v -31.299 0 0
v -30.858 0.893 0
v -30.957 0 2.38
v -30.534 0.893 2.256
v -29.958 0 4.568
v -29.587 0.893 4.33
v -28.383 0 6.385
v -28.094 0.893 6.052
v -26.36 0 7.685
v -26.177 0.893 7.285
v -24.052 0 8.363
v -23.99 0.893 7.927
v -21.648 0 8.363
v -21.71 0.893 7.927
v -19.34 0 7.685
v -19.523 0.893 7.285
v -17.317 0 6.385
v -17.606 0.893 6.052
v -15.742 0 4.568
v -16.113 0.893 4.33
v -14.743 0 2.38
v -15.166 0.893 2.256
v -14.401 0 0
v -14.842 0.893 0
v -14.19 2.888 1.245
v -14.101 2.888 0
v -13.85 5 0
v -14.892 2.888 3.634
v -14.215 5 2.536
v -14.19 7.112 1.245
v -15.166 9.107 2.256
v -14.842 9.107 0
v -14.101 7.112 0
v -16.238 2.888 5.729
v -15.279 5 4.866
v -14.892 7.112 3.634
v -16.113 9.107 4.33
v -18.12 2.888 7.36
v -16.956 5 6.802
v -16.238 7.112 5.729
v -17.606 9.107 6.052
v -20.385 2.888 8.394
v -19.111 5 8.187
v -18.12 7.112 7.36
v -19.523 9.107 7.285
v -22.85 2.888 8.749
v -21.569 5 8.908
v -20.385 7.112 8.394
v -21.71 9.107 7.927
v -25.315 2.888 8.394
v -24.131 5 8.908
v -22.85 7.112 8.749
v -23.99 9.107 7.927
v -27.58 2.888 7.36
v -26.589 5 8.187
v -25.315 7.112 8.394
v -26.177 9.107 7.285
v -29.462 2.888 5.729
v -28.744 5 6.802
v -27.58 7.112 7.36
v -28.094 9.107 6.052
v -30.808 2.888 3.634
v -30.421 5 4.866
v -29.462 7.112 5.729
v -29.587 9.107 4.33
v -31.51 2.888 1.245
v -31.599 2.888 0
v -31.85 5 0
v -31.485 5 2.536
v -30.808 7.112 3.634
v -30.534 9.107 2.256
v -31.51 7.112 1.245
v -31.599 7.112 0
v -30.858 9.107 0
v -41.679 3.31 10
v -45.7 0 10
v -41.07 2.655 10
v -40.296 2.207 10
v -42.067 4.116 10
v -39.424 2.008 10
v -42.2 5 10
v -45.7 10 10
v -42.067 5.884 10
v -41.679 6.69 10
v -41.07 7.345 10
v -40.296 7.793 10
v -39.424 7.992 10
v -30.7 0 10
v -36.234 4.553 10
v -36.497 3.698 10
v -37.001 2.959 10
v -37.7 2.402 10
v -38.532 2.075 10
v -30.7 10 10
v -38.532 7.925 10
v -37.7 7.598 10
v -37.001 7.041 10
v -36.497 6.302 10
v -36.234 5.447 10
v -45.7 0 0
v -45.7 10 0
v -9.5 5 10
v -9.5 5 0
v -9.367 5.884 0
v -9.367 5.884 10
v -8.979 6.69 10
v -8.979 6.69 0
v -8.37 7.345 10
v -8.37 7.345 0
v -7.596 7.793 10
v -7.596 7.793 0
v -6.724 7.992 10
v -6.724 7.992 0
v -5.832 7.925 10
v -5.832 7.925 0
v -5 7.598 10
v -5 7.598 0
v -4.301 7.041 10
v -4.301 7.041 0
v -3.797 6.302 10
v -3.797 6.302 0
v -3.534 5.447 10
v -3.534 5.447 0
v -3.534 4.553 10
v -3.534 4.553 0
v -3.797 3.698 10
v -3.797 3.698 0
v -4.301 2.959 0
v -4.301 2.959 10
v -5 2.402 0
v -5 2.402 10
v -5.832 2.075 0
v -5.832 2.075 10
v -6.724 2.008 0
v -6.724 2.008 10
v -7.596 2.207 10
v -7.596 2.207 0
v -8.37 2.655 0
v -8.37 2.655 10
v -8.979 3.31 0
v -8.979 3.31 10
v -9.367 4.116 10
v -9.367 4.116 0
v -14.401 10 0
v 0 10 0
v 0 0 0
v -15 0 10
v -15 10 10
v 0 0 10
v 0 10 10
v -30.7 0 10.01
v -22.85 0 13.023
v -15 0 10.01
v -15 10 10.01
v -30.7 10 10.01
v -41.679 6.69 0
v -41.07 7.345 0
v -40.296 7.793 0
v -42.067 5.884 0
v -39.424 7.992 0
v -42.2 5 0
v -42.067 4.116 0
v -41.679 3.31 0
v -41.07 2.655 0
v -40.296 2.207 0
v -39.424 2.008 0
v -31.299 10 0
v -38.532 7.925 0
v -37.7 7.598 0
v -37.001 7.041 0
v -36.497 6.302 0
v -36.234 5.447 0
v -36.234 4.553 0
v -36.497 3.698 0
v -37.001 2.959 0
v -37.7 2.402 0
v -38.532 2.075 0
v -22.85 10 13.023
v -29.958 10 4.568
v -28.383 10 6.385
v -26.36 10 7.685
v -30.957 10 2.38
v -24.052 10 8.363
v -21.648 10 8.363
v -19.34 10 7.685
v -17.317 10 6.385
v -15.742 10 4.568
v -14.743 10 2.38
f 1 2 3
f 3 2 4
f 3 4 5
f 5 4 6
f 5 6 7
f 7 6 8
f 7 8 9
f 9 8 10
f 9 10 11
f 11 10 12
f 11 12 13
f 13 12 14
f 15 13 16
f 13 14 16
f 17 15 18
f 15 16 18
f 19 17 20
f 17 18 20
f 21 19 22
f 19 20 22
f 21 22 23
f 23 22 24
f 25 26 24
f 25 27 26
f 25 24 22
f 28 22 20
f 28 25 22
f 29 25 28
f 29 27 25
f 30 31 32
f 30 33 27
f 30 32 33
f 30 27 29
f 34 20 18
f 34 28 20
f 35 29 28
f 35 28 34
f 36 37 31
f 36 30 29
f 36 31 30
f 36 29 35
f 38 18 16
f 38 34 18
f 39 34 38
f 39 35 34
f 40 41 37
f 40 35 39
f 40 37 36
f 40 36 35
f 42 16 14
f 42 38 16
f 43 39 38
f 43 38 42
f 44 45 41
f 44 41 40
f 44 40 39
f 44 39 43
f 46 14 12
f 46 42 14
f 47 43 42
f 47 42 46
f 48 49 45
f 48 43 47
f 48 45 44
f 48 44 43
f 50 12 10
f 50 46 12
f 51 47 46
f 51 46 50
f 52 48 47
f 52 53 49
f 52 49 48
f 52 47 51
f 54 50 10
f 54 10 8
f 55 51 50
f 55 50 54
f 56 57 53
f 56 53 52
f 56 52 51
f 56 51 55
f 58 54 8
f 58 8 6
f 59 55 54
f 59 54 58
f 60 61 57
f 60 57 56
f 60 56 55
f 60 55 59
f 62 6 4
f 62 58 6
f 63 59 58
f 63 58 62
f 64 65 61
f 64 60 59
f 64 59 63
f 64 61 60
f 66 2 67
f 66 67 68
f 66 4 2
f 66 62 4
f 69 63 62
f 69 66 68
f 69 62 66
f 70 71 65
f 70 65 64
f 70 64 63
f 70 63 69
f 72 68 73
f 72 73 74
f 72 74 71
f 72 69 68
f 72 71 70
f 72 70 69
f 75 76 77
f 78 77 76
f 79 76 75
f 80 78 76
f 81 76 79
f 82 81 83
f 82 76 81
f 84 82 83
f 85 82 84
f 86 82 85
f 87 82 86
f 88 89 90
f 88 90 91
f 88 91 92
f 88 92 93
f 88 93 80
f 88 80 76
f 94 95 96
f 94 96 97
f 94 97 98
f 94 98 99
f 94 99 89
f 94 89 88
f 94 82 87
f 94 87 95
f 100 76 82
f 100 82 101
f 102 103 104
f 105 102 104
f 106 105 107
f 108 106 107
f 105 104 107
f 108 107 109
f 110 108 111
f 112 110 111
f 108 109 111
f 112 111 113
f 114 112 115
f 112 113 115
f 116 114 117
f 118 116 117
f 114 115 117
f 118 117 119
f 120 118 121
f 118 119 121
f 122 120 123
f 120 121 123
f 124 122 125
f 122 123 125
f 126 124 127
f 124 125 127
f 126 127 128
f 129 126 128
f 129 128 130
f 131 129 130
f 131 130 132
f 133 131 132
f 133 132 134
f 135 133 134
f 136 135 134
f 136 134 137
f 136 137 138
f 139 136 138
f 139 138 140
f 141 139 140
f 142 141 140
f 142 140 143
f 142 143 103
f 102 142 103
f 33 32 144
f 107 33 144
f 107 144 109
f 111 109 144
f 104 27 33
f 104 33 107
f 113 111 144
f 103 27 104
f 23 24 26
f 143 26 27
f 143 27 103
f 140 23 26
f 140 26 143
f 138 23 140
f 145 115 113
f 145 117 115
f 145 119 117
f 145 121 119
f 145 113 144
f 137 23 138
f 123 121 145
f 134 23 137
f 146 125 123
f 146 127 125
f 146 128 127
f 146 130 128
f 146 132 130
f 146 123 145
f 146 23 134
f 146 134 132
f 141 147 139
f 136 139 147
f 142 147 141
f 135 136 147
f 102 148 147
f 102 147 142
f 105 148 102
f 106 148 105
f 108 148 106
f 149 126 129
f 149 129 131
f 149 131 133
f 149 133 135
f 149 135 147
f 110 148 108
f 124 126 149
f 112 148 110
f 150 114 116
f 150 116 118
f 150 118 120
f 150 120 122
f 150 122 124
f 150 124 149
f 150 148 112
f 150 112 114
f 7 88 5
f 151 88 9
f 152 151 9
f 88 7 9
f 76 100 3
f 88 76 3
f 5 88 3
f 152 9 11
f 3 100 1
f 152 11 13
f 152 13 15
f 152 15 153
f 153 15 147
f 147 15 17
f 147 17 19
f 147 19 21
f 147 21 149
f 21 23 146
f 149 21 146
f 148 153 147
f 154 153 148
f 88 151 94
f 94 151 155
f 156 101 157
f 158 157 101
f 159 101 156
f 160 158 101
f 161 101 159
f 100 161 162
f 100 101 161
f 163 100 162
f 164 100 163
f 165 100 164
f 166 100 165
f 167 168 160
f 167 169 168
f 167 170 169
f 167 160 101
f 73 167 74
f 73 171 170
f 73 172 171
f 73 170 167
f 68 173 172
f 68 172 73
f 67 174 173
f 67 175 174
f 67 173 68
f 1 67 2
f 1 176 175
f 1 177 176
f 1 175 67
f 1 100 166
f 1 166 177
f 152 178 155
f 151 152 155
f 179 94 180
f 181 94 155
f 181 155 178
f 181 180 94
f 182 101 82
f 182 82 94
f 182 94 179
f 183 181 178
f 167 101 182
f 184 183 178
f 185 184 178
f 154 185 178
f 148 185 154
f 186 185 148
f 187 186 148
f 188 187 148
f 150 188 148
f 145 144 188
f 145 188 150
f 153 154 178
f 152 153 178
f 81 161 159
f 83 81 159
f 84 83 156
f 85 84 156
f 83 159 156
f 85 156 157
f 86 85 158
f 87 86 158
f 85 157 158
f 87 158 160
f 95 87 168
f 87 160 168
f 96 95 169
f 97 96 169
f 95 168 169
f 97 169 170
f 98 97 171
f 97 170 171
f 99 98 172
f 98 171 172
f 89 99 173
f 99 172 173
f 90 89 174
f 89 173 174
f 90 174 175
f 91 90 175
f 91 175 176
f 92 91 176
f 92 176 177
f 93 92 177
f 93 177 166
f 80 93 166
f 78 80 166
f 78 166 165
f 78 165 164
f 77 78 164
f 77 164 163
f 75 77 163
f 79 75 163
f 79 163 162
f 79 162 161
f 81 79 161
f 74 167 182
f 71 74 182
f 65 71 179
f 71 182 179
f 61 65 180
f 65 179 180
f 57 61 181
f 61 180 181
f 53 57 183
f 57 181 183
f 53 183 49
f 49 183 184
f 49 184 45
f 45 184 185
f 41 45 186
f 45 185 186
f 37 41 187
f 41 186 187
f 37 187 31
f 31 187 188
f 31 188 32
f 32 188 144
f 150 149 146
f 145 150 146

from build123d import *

# Parameters (mm, degrees)
SKETCH2_W           = 45.7
SKETCH2_H           = 15
BOSS_EXTRUDE1_DEPTH = 10
SKETCH4_R           = 3
CUT_EXTRUDE1_DEPTH  = 50.127283662
SKETCH5_W           = 15
SKETCH5_H           = 10
CUT_EXTRUDE2_DEPTH  = 5
CHAMFER1_SIZE       = 4.990232455
CHAMFER1_SIZE_2     = 13
CHAMFER2_SIZE       = 0.965614075


with BuildPart() as part:
    # Sketch2 → Boss-Extrude1 (new body)
    with BuildSketch(Plane(origin=(0, 0, 0), x_dir=(1, 0, 0), z_dir=(0, 1, 0))):
        with Locations((-22.85, -7.5)):
            Rectangle(SKETCH2_W, SKETCH2_H)
    extrude(amount=BOSS_EXTRUDE1_DEPTH)

    # Sketch3 → Cut-Revolve1 (revolve, cut)
    with BuildSketch(Plane(origin=(0, 0, 0), x_dir=(-1, 0, 0), z_dir=(0, 0, -1))):
        with BuildLine():
            Line((22.85, 14), (22.85, -4))
            ThreePointArc((22.85, -4), (13.85, 5), (22.85, 14))
        make_face()
    revolve(axis=Axis((-22.85, 14, 0), (0, -1, 0)), mode=Mode.SUBTRACT)

    # Sketch4 → Cut-Extrude1 (cut, through all)
    with BuildSketch(Plane(origin=(0, 0, 0), x_dir=(-1, 0, 0), z_dir=(0, 0, -1))):
        with Locations((6.5, 5)):
            Circle(SKETCH4_R)
        with Locations((39.2, 5)):
            Circle(SKETCH4_R)
    extrude(amount=-CUT_EXTRUDE1_DEPTH, mode=Mode.SUBTRACT)

    # Sketch5 → Cut-Extrude2 (cut)
    with BuildSketch(Plane.XY.offset(15)):
        with Locations((-38.2, 5)):
            Rectangle(SKETCH5_W, SKETCH5_H)
        with Locations((-7.5, 5)):
            Rectangle(SKETCH5_W, SKETCH5_H)
    extrude(amount=-CUT_EXTRUDE2_DEPTH, mode=Mode.SUBTRACT)

    # Chamfer1
    # the kernel refuses this chamfer: 13, 4.990232455 mm, written as the material it takes off along each edge
    with BuildSketch(Plane(origin=(-15, 43.716873314, 15), x_dir=(0, 0, -1), z_dir=(0, -1, 0))) as chamfer1_piece_1:
        Polygon((CHAMFER1_SIZE, 0), (0, -CHAMFER1_SIZE_2), (0, 0), align=None)
    extrude(amount=77.433746627, mode=Mode.SUBTRACT)
    with BuildSketch(Plane(origin=(-30.7, 43.716873314, 15), x_dir=(1, 0, 0), z_dir=(0, -1, 0))) as chamfer1_piece_2:
        Polygon((CHAMFER1_SIZE_2, 0), (0, -CHAMFER1_SIZE), (0, 0), align=None)
    extrude(amount=77.433746627, mode=Mode.SUBTRACT)

    # Chamfer2
    # the kernel refuses this chamfer: 1, 0.965614075 mm, written as the material it takes off along each edge
    with BuildSketch(Plane(origin=(-22.85, 0, 0), x_dir=(-0.9379115380464662, 0, -0.34687454043113636), z_dir=(0.34687454043113636, 0, -0.9379115380464662))) as chamfer2_piece_1:
        with BuildLine():
            Line((7.483314774 + CHAMFER2_SIZE, 0), (8.008407714, 0.893248743))
            ThreePointArc((8.008407714, 0.893248743), (7.764305072, 0.44856432), (7.483314774, 0))
            Line((7.483314774, 0), (7.483314774 + CHAMFER2_SIZE, 0))
        make_face()
    revolve(axis=Axis((-22.85, 0, 0), (0, 1, 0)), revolution_arc=220.592533512, mode=Mode.SUBTRACT)
    with BuildSketch(Plane(origin=(-22.85, 10, 0), x_dir=(-0.9379115380464663, 0, -0.3468745404311359), z_dir=(0.3468745404311359, 0, -0.9379115380464663))) as chamfer2_piece_2:
        with BuildLine():
            Line((8.008407714, -0.893248743), (7.483314774 + CHAMFER2_SIZE, 0))
            Line((7.483314774 + CHAMFER2_SIZE, 0), (7.483314774, 0))
            ThreePointArc((7.483314774, 0), (7.764305072, -0.44856432), (8.008407714, -0.893248743))
        make_face()
    revolve(axis=Axis((-22.85, 10, 0), (0, 1, 0)), revolution_arc=220.592533512, mode=Mode.SUBTRACT)


solid = part.part
